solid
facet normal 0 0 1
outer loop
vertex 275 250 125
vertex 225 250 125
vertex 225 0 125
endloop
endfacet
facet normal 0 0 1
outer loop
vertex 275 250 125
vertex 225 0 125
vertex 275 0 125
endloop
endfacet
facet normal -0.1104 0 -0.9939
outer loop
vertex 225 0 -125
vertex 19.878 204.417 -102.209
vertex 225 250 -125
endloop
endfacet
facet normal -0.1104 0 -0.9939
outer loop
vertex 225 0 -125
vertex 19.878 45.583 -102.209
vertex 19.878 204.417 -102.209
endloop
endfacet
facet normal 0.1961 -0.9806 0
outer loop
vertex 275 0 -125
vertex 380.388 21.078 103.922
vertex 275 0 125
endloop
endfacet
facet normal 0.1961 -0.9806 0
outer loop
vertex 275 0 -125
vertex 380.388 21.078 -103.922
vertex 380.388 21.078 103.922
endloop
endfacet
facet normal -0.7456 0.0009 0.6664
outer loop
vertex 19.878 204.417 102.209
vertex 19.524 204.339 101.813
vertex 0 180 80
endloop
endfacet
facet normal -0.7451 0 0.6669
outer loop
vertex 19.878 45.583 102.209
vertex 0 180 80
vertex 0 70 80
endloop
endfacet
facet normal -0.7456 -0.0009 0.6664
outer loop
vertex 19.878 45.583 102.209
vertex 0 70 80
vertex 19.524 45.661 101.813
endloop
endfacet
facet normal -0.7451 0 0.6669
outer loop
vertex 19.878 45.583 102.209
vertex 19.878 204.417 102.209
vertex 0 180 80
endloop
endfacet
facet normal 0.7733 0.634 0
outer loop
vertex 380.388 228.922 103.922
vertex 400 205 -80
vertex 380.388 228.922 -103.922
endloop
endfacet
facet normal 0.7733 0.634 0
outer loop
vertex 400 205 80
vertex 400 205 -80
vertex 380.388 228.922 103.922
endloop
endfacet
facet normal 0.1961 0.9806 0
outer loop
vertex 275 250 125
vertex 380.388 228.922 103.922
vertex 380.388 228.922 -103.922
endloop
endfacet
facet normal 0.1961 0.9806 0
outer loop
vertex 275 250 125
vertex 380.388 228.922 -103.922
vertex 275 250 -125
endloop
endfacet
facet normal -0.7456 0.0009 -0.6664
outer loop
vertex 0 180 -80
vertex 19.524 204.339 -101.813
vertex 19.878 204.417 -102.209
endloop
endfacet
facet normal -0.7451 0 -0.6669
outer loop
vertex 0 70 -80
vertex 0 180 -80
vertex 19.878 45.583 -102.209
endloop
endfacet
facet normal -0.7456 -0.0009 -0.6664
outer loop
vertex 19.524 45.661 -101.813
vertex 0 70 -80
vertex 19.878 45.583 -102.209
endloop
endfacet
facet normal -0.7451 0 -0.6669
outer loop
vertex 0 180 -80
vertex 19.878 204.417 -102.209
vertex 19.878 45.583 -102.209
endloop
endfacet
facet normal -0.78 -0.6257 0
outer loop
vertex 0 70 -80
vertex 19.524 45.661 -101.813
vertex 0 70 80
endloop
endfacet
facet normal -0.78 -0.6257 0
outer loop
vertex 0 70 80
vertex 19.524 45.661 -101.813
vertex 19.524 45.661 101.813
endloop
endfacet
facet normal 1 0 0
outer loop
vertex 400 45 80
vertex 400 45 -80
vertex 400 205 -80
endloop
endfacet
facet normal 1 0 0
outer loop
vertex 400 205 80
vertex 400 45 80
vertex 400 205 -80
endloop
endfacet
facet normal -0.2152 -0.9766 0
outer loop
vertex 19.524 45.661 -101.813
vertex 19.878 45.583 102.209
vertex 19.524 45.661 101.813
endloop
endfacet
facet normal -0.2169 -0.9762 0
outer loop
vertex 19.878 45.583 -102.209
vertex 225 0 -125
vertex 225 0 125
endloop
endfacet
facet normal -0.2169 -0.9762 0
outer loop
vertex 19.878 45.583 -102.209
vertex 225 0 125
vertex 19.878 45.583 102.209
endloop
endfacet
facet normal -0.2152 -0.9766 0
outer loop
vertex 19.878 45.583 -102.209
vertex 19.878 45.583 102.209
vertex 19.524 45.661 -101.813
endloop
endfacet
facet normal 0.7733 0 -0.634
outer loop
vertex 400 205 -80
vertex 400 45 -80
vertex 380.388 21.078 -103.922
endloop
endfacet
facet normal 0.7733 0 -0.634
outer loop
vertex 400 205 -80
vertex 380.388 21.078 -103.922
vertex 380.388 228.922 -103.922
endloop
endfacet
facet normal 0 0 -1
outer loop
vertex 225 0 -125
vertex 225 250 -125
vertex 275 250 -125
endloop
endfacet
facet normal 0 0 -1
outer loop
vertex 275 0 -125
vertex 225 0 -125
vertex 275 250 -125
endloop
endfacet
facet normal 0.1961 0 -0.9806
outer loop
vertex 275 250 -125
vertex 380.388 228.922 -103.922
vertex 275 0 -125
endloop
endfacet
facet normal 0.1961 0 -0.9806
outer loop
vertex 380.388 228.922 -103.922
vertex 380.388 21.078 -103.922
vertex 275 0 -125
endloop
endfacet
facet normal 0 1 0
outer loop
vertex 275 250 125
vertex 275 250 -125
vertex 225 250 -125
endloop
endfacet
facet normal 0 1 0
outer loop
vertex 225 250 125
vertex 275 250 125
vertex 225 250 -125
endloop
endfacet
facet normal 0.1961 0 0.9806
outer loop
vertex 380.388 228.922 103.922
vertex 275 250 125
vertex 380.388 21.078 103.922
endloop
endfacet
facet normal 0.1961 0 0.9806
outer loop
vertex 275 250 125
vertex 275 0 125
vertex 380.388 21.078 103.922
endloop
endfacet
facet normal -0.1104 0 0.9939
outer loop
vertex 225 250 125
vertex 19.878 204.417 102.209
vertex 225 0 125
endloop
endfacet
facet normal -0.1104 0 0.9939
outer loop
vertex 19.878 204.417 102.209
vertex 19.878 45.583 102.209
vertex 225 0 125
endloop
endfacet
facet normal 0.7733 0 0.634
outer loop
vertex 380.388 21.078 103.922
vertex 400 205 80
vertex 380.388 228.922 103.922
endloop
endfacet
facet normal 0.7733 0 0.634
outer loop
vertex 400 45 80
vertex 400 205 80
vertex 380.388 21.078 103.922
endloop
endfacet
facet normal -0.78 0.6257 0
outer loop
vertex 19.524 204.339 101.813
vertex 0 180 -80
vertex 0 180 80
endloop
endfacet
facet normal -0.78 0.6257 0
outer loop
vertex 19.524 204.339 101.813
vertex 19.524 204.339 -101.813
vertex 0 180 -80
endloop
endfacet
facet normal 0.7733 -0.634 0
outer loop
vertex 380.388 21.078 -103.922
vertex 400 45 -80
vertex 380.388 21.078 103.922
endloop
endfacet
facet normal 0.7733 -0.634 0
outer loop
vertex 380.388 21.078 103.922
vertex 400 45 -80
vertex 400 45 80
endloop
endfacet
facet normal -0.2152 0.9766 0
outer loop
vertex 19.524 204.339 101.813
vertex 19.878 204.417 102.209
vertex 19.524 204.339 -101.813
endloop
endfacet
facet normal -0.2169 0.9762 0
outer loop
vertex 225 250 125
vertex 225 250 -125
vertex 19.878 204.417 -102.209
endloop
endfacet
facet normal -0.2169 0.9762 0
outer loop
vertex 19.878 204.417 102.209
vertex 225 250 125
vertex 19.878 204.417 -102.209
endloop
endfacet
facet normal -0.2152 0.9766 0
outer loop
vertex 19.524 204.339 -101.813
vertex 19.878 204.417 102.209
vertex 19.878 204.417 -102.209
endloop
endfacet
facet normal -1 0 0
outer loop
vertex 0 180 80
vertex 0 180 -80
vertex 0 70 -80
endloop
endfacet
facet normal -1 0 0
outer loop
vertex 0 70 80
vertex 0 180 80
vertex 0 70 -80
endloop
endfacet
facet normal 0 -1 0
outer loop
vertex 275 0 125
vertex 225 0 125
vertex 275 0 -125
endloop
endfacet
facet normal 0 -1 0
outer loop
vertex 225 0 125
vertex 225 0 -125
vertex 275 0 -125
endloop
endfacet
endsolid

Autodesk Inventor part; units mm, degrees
ref_plane "YZ Plane" through (0, 0, 0) normal (1, 0, 0) x (0, 1, 0)
ref_plane "XZ Plane" through (0, 0, 0) normal (0, 1, 0) x (-1, 0, 0)
ref_plane "XY Plane" through (0, 0, 0) normal (0, 0, 1) x (1, 0, 0)
sketch "Sketch1" plane through (0, 0, 0) normal (0, 0, 1) x (1, 0, 0)
  line L0 (0, 0) -> (400, 0)
  line L1 (400, 0) -> (400, 250)
  line L2 (400, 250) -> (0, 250)
  line L3 (0, 250) -> (0, 0)
  dimension "d0" = 400
  dimension "d1" = 250
extrude "Extrusion1" add sketch "Sketch1" along normal mid plane 250
sketch "Sketch2" plane through (0, 0, 0) normal (0, 0, 1) x (1, 0, 0)
  line L0 (400, 0) -> (400, 250) projected
  line L1 (400, 225) -> (275, 250)
  line L2 (400, 250) -> (0, 250) projected
  line L3 (275, 250) -> (400, 250)
  line L4 (400, 225) -> (400, 250)
  line L5 (400, 25) -> (275, 0)
  line L6 (0, 0) -> (400, 0) projected
  line L7 (225, 250) -> (0, 200)
  line L8 (0, 250) -> (0, 0) projected
  line L9 (225, 0) -> (0, 50)
  line L10 (400, 25) -> (400, 0)
  line L11 (275, 0) -> (400, 0)
  line L12 (225, 0) -> (0, 0)
  line L13 (0, 0) -> (0, 50)
  line L14 (0, 200) -> (0, 250)
  line L15 (225, 250) -> (0, 250)
  dimension "d4" = 25
  dimension "d5" = 125
  dimension "d6" = 25
  dimension "d7" = 125
  dimension "d8" = 50
  dimension "d9" = 50
  dimension "d10" = 50
  dimension "d11" = 50
extrude "Extrusion2" cut sketch "Sketch2" along normal through all both and the other way through all contours L6 L5 L0 | L1 L2 L0 | L6 L8 L9 | L7 L8 L2
sketch "Sketch3" plane through (0, 0, 0) normal (0, 1, 0) x (-1, 0, 0)
  line L0 (-275, -125) -> (-400, -125)
  line L1 (-400, -125) -> (-400, -100)
  line L2 (-400, -100) -> (-275, -125)
  line L3 (-275, 125) -> (-400, 125)
  line L4 (-400, 125) -> (-400, 100)
  line L5 (-275, 125) -> (-400, 100)
  line L6 (0, 0) -> (-400, 0) construction
  line L7 (0, 0) -> (0, 125) construction
  line L8 (0, 0) -> (0, -125) construction
  dimension "d28" = 25
  dimension "d29" = 25
  dimension "d32" = 400
  dimension "d33" = 100
  dimension "d34" = 100
  dimension "d35" = 125
  dimension "d36" = 125
  dimension "d37" = 125
  dimension "d38" = 125
  dimension "d39" = 400
  dimension "d40" = 400
extrude "Extrusion3" cut sketch "Sketch3" along normal through all
sketch "Sketch4" plane through (0, 0, 0) normal (0, 1, 0) x (-1, 0, 0)
  line L0 (0, -125) -> (-400, -125) projected
  line L1 (-225, -125) -> (0, -125)
  line L2 (0, -125) -> (0, -100)
  line L3 (0, -100) -> (-225, -125)
  line L4 (-225, 125) -> (0, 125) projected
  line L5 (-225, 125) -> (0, 125)
  line L6 (0, 125) -> (0, 100)
  line L7 (0, 100) -> (-225, 125)
  point P0 (0, 0)
  point P1 (-275, -125)
  dimension "d18" = 25
  dimension "d19" = 25
extrude "Extrusion4" cut sketch "Sketch4" along normal through all
chamfer "Chamfer1" distance 20 angle 45 4 edges at (0, 125, -100) (0, 125, 100) (0, 200, 0) (0, 50, 0)
chamfer "Chamfer2" distance 20 angle 45 4 edges at (400, 225, 0) (400, 125, -100) (400, 125, 100) (400, 25, 0)
properties part number "Scorpion Body"
